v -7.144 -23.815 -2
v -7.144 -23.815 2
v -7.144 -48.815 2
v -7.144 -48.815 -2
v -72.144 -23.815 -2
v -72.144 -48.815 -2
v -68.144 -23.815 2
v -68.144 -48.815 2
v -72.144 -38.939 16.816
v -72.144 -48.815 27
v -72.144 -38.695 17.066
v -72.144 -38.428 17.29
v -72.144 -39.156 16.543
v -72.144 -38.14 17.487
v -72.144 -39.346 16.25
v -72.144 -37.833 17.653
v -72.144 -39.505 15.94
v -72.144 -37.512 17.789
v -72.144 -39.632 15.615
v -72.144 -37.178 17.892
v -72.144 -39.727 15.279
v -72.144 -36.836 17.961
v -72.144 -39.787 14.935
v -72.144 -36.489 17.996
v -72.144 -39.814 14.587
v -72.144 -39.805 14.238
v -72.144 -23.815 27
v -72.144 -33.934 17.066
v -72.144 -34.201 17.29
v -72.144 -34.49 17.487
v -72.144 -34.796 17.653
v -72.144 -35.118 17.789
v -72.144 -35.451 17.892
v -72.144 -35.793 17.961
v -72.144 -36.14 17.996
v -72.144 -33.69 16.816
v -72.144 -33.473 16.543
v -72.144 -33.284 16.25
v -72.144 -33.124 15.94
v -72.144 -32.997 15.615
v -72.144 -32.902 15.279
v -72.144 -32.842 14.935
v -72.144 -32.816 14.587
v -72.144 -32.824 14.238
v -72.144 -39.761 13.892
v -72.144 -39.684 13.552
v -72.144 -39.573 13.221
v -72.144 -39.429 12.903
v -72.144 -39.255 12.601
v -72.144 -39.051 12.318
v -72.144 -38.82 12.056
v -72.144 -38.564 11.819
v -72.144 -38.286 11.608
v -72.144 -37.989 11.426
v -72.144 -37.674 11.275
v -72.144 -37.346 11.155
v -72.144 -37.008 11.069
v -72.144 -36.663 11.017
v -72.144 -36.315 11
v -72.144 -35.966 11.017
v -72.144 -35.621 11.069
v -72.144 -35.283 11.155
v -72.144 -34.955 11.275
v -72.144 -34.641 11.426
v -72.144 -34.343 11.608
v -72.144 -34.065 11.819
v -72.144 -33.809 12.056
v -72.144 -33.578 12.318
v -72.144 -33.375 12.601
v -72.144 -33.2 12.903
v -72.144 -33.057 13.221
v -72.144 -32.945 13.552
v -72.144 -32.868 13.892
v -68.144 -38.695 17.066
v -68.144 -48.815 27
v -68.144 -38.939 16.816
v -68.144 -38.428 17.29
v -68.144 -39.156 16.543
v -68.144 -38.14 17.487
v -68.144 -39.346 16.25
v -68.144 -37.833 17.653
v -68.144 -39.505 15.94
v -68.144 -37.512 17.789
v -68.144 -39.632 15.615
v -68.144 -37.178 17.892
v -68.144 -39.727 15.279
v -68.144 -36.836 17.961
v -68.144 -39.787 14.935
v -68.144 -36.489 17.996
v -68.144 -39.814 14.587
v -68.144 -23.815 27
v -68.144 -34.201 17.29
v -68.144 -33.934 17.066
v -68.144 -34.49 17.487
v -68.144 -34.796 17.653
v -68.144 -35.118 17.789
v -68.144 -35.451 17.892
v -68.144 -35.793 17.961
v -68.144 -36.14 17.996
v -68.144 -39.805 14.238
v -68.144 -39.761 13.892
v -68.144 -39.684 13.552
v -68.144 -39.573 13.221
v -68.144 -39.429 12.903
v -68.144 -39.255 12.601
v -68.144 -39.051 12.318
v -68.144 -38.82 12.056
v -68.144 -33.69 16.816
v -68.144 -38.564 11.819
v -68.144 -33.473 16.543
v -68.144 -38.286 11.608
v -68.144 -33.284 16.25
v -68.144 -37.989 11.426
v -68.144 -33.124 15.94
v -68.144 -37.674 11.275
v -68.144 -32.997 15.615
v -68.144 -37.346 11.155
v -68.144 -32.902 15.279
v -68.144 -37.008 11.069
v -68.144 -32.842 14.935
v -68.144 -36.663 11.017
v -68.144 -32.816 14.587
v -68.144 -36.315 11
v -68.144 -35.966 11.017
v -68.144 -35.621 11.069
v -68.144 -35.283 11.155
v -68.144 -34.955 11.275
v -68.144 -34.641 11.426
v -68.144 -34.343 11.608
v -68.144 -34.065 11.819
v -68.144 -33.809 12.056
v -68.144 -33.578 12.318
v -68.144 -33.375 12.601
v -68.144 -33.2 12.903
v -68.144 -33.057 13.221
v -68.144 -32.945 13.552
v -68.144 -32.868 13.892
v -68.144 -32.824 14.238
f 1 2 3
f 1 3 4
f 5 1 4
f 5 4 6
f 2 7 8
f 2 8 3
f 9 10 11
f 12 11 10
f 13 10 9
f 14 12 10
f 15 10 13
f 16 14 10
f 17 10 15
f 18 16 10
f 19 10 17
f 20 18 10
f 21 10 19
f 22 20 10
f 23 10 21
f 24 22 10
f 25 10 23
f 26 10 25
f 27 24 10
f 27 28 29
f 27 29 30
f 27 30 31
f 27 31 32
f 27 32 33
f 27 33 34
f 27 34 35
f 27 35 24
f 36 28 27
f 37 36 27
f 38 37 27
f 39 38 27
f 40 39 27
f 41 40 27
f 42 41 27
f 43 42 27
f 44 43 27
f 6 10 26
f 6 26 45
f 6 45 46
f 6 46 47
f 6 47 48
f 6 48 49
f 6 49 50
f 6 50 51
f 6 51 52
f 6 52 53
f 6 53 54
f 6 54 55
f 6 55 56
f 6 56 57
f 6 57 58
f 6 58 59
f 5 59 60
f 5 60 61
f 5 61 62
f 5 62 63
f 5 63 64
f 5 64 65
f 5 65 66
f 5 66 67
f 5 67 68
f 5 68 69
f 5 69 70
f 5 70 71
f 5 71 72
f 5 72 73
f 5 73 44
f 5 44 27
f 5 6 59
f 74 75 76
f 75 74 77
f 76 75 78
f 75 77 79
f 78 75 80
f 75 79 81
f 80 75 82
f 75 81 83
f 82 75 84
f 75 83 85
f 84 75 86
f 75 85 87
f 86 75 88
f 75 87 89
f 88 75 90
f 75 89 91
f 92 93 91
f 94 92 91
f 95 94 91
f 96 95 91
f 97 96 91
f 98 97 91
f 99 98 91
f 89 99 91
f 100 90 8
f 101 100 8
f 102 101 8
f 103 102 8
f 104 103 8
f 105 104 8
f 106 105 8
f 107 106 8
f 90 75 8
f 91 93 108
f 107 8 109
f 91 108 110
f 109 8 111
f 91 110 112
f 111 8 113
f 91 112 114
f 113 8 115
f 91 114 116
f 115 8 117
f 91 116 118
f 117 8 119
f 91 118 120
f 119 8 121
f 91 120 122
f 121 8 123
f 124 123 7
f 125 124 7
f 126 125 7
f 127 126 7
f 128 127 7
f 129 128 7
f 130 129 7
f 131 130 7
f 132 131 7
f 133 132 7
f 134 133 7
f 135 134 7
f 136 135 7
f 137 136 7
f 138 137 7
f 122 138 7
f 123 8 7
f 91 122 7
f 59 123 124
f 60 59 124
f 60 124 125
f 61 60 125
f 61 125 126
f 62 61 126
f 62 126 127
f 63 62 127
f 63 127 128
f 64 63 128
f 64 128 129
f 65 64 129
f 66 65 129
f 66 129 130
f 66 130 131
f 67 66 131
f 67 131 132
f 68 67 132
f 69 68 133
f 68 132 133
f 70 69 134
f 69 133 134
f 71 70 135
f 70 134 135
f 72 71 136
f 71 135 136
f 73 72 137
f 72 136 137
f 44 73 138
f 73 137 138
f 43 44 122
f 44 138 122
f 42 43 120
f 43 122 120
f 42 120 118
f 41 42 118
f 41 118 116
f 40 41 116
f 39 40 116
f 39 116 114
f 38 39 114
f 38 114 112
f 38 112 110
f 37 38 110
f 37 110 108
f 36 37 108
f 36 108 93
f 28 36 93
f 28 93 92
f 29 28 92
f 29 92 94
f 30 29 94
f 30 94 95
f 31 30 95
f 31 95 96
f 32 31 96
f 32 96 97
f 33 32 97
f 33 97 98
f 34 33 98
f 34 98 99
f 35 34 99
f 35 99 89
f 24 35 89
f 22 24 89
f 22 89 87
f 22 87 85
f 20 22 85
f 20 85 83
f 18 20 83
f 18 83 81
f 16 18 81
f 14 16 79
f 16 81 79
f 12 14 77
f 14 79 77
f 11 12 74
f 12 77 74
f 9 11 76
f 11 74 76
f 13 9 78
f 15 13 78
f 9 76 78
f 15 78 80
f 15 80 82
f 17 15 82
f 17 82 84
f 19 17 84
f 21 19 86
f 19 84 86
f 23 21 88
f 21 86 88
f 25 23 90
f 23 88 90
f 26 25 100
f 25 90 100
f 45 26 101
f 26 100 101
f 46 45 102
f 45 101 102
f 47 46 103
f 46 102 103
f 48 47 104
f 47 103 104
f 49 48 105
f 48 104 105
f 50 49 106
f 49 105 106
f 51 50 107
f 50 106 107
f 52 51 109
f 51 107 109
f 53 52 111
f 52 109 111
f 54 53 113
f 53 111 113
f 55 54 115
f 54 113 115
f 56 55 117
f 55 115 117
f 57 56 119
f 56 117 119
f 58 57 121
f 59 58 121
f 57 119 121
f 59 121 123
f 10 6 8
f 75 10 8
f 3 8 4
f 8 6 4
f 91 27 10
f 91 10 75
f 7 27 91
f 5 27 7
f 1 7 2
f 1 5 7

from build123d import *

# Parameters (mm, degrees)
SKETCH1_W                = 57.8
SKETCH1_H                = 24.4
BOSS_EXTRUDE1_DEPTH      = 2
SKETCH2_W                = 4
SKETCH2_H                = 24.4
BOSS_EXTRUDE2_DEPTH      = 24.4
SKETCH3_R                = 3
CUT_EXTRUDE1_DEPTH       = 78.293389523
SKETCH4_R                = 1.5
CUT_EXTRUDE2_DEPTH       = 91.459620286
SKETCH5_W                = 57.8
SKETCH5_H                = 24.4
BOSS_EXTRUDE3_DEPTH      = 2
SKETCH6_R                = 1.5
CUT_EXTRUDE3_DEPTH       = 13
SKETCH8_W                = 4
SKETCH8_H                = 24.4
BOSS_EXTRUDE4_DEPTH      = 25
BOSS_EXTRUDE5_DEPTH      = 25
SKETCH10_R               = 1.5
CUT_EXTRUDE4_DEPTH       = 91.623302203
SKETCH11_R               = 3.5
CUT_EXTRUDE5_DEPTH       = 78.500374605
BOSS_EXTRUDE6_DEPTH      = 61
BOSS_EXTRUDE6_DEPTH_BACK = 4
SKETCH14_W               = 4
SKETCH14_H               = 25


with BuildPart() as part:
    # Sketch1 → Boss-Extrude1 (new body)
    with BuildSketch(Plane.XY):
        with Locations((-43.243709624, -36.61462961)):
            Rectangle(SKETCH1_W, SKETCH1_H)
    extrude(amount=BOSS_EXTRUDE1_DEPTH)

    # Sketch2 → Boss-Extrude2 (add)
    with BuildSketch(Plane.XY.offset(2)):
        with Locations((-70.143709624, -36.61462961)):
            Rectangle(SKETCH2_W, SKETCH2_H)
    extrude(amount=BOSS_EXTRUDE2_DEPTH)

    # Sketch3 → Cut-Extrude1 (cut, through all)
    with BuildSketch(Plane(origin=(-68.143709624, 0, 0), x_dir=(0, 0, -1), z_dir=(1, 0, 0))):
        with Locations((-14.2, -36.61462961)):
            Circle(SKETCH3_R)
    extrude(amount=-CUT_EXTRUDE1_DEPTH, mode=Mode.SUBTRACT)

    # Sketch4 → Cut-Extrude2 (cut, through all)
    with BuildSketch(Plane.XY.offset(2)):
        with Locations((-60.143709624, -43.81462961)):
            Circle(SKETCH4_R)
        with Locations((-20.143709624, -43.81462961)):
            Circle(SKETCH4_R)
        with Locations((-20.143709624, -28.81462961)):
            Circle(SKETCH4_R)
        with Locations((-60.143709624, -28.81462961)):
            Circle(SKETCH4_R)
    extrude(amount=-CUT_EXTRUDE2_DEPTH, mode=Mode.SUBTRACT)

    # Sketch5 → Boss-Extrude3 (add)
    with BuildSketch(Plane(origin=(0, 0, 0), x_dir=(-1, 0, 0), z_dir=(0, 0, -1))):
        with Locations((43.243709624, -36.61462961)):
            Rectangle(SKETCH5_W, SKETCH5_H)
    extrude(amount=BOSS_EXTRUDE3_DEPTH)

    # Sketch6 → Cut-Extrude3 (cut)
    with BuildSketch(Plane.XY):
        with Locations((-60.143709624, -28.81462961)):
            Circle(SKETCH6_R)
        with Locations((-20.143709624, -28.81462961)):
            Circle(SKETCH6_R)
        with Locations((-20.143709624, -43.81462961)):
            Circle(SKETCH6_R)
        with Locations((-60.143709624, -43.81462961)):
            Circle(SKETCH6_R)
    extrude(amount=-CUT_EXTRUDE3_DEPTH, mode=Mode.SUBTRACT)

    # Sketch8 → Boss-Extrude4 (add)
    with BuildSketch(Plane.XY.offset(2)):
        with Locations((-70.143709624, -36.61462961)):
            Rectangle(SKETCH8_W, SKETCH8_H)
    extrude(amount=BOSS_EXTRUDE4_DEPTH)

    # Sketch9 → Boss-Extrude5 (add)
    with BuildSketch(Plane(origin=(0, -48.81462961, 0), x_dir=(-1, 0, 0), z_dir=(0, -1, 0))):
        Polygon((72.143709624, -27), (68.143709624, -27), (68.143709624, -2), (14.343709624, -2), (14.343709624, 2), (72.143709624, 2), align=None)
    extrude(amount=-BOSS_EXTRUDE5_DEPTH)

    # Sketch10 → Cut-Extrude4 (cut, through all)
    with BuildSketch(Plane.XY.offset(2)):
        with Locations((-58.143709624, -28.81462961)):
            Circle(SKETCH10_R)
        with Locations((-28.143709624, -28.81462961)):
            Circle(SKETCH10_R)
        with Locations((-28.143709624, -43.81462961)):
            Circle(SKETCH10_R)
        with Locations((-58.143709624, -43.81462961)):
            Circle(SKETCH10_R)
    extrude(amount=-CUT_EXTRUDE4_DEPTH, mode=Mode.SUBTRACT)

    # Sketch11 → Cut-Extrude5 (cut, through all)
    with BuildSketch(Plane(origin=(-68.143709624, 0, 0), x_dir=(0, 0, -1), z_dir=(1, 0, 0))):
        with Locations((-14.5, -36.31462961)):
            Circle(SKETCH11_R)
    extrude(amount=-CUT_EXTRUDE5_DEPTH, mode=Mode.SUBTRACT)

    # Sketch14 → Boss-Extrude6 (add, two sides: drawn at the far end of the back side and taken through both)
    with BuildSketch(Plane(origin=(-68.143709624, 0, 0), x_dir=(0, 0, -1), z_dir=(1, 0, 0)).offset(-BOSS_EXTRUDE6_DEPTH_BACK)):
        with Locations((0, -36.31462961)):
            Rectangle(SKETCH14_W, SKETCH14_H)
    extrude(amount=BOSS_EXTRUDE6_DEPTH + BOSS_EXTRUDE6_DEPTH_BACK)


solid = part.part
